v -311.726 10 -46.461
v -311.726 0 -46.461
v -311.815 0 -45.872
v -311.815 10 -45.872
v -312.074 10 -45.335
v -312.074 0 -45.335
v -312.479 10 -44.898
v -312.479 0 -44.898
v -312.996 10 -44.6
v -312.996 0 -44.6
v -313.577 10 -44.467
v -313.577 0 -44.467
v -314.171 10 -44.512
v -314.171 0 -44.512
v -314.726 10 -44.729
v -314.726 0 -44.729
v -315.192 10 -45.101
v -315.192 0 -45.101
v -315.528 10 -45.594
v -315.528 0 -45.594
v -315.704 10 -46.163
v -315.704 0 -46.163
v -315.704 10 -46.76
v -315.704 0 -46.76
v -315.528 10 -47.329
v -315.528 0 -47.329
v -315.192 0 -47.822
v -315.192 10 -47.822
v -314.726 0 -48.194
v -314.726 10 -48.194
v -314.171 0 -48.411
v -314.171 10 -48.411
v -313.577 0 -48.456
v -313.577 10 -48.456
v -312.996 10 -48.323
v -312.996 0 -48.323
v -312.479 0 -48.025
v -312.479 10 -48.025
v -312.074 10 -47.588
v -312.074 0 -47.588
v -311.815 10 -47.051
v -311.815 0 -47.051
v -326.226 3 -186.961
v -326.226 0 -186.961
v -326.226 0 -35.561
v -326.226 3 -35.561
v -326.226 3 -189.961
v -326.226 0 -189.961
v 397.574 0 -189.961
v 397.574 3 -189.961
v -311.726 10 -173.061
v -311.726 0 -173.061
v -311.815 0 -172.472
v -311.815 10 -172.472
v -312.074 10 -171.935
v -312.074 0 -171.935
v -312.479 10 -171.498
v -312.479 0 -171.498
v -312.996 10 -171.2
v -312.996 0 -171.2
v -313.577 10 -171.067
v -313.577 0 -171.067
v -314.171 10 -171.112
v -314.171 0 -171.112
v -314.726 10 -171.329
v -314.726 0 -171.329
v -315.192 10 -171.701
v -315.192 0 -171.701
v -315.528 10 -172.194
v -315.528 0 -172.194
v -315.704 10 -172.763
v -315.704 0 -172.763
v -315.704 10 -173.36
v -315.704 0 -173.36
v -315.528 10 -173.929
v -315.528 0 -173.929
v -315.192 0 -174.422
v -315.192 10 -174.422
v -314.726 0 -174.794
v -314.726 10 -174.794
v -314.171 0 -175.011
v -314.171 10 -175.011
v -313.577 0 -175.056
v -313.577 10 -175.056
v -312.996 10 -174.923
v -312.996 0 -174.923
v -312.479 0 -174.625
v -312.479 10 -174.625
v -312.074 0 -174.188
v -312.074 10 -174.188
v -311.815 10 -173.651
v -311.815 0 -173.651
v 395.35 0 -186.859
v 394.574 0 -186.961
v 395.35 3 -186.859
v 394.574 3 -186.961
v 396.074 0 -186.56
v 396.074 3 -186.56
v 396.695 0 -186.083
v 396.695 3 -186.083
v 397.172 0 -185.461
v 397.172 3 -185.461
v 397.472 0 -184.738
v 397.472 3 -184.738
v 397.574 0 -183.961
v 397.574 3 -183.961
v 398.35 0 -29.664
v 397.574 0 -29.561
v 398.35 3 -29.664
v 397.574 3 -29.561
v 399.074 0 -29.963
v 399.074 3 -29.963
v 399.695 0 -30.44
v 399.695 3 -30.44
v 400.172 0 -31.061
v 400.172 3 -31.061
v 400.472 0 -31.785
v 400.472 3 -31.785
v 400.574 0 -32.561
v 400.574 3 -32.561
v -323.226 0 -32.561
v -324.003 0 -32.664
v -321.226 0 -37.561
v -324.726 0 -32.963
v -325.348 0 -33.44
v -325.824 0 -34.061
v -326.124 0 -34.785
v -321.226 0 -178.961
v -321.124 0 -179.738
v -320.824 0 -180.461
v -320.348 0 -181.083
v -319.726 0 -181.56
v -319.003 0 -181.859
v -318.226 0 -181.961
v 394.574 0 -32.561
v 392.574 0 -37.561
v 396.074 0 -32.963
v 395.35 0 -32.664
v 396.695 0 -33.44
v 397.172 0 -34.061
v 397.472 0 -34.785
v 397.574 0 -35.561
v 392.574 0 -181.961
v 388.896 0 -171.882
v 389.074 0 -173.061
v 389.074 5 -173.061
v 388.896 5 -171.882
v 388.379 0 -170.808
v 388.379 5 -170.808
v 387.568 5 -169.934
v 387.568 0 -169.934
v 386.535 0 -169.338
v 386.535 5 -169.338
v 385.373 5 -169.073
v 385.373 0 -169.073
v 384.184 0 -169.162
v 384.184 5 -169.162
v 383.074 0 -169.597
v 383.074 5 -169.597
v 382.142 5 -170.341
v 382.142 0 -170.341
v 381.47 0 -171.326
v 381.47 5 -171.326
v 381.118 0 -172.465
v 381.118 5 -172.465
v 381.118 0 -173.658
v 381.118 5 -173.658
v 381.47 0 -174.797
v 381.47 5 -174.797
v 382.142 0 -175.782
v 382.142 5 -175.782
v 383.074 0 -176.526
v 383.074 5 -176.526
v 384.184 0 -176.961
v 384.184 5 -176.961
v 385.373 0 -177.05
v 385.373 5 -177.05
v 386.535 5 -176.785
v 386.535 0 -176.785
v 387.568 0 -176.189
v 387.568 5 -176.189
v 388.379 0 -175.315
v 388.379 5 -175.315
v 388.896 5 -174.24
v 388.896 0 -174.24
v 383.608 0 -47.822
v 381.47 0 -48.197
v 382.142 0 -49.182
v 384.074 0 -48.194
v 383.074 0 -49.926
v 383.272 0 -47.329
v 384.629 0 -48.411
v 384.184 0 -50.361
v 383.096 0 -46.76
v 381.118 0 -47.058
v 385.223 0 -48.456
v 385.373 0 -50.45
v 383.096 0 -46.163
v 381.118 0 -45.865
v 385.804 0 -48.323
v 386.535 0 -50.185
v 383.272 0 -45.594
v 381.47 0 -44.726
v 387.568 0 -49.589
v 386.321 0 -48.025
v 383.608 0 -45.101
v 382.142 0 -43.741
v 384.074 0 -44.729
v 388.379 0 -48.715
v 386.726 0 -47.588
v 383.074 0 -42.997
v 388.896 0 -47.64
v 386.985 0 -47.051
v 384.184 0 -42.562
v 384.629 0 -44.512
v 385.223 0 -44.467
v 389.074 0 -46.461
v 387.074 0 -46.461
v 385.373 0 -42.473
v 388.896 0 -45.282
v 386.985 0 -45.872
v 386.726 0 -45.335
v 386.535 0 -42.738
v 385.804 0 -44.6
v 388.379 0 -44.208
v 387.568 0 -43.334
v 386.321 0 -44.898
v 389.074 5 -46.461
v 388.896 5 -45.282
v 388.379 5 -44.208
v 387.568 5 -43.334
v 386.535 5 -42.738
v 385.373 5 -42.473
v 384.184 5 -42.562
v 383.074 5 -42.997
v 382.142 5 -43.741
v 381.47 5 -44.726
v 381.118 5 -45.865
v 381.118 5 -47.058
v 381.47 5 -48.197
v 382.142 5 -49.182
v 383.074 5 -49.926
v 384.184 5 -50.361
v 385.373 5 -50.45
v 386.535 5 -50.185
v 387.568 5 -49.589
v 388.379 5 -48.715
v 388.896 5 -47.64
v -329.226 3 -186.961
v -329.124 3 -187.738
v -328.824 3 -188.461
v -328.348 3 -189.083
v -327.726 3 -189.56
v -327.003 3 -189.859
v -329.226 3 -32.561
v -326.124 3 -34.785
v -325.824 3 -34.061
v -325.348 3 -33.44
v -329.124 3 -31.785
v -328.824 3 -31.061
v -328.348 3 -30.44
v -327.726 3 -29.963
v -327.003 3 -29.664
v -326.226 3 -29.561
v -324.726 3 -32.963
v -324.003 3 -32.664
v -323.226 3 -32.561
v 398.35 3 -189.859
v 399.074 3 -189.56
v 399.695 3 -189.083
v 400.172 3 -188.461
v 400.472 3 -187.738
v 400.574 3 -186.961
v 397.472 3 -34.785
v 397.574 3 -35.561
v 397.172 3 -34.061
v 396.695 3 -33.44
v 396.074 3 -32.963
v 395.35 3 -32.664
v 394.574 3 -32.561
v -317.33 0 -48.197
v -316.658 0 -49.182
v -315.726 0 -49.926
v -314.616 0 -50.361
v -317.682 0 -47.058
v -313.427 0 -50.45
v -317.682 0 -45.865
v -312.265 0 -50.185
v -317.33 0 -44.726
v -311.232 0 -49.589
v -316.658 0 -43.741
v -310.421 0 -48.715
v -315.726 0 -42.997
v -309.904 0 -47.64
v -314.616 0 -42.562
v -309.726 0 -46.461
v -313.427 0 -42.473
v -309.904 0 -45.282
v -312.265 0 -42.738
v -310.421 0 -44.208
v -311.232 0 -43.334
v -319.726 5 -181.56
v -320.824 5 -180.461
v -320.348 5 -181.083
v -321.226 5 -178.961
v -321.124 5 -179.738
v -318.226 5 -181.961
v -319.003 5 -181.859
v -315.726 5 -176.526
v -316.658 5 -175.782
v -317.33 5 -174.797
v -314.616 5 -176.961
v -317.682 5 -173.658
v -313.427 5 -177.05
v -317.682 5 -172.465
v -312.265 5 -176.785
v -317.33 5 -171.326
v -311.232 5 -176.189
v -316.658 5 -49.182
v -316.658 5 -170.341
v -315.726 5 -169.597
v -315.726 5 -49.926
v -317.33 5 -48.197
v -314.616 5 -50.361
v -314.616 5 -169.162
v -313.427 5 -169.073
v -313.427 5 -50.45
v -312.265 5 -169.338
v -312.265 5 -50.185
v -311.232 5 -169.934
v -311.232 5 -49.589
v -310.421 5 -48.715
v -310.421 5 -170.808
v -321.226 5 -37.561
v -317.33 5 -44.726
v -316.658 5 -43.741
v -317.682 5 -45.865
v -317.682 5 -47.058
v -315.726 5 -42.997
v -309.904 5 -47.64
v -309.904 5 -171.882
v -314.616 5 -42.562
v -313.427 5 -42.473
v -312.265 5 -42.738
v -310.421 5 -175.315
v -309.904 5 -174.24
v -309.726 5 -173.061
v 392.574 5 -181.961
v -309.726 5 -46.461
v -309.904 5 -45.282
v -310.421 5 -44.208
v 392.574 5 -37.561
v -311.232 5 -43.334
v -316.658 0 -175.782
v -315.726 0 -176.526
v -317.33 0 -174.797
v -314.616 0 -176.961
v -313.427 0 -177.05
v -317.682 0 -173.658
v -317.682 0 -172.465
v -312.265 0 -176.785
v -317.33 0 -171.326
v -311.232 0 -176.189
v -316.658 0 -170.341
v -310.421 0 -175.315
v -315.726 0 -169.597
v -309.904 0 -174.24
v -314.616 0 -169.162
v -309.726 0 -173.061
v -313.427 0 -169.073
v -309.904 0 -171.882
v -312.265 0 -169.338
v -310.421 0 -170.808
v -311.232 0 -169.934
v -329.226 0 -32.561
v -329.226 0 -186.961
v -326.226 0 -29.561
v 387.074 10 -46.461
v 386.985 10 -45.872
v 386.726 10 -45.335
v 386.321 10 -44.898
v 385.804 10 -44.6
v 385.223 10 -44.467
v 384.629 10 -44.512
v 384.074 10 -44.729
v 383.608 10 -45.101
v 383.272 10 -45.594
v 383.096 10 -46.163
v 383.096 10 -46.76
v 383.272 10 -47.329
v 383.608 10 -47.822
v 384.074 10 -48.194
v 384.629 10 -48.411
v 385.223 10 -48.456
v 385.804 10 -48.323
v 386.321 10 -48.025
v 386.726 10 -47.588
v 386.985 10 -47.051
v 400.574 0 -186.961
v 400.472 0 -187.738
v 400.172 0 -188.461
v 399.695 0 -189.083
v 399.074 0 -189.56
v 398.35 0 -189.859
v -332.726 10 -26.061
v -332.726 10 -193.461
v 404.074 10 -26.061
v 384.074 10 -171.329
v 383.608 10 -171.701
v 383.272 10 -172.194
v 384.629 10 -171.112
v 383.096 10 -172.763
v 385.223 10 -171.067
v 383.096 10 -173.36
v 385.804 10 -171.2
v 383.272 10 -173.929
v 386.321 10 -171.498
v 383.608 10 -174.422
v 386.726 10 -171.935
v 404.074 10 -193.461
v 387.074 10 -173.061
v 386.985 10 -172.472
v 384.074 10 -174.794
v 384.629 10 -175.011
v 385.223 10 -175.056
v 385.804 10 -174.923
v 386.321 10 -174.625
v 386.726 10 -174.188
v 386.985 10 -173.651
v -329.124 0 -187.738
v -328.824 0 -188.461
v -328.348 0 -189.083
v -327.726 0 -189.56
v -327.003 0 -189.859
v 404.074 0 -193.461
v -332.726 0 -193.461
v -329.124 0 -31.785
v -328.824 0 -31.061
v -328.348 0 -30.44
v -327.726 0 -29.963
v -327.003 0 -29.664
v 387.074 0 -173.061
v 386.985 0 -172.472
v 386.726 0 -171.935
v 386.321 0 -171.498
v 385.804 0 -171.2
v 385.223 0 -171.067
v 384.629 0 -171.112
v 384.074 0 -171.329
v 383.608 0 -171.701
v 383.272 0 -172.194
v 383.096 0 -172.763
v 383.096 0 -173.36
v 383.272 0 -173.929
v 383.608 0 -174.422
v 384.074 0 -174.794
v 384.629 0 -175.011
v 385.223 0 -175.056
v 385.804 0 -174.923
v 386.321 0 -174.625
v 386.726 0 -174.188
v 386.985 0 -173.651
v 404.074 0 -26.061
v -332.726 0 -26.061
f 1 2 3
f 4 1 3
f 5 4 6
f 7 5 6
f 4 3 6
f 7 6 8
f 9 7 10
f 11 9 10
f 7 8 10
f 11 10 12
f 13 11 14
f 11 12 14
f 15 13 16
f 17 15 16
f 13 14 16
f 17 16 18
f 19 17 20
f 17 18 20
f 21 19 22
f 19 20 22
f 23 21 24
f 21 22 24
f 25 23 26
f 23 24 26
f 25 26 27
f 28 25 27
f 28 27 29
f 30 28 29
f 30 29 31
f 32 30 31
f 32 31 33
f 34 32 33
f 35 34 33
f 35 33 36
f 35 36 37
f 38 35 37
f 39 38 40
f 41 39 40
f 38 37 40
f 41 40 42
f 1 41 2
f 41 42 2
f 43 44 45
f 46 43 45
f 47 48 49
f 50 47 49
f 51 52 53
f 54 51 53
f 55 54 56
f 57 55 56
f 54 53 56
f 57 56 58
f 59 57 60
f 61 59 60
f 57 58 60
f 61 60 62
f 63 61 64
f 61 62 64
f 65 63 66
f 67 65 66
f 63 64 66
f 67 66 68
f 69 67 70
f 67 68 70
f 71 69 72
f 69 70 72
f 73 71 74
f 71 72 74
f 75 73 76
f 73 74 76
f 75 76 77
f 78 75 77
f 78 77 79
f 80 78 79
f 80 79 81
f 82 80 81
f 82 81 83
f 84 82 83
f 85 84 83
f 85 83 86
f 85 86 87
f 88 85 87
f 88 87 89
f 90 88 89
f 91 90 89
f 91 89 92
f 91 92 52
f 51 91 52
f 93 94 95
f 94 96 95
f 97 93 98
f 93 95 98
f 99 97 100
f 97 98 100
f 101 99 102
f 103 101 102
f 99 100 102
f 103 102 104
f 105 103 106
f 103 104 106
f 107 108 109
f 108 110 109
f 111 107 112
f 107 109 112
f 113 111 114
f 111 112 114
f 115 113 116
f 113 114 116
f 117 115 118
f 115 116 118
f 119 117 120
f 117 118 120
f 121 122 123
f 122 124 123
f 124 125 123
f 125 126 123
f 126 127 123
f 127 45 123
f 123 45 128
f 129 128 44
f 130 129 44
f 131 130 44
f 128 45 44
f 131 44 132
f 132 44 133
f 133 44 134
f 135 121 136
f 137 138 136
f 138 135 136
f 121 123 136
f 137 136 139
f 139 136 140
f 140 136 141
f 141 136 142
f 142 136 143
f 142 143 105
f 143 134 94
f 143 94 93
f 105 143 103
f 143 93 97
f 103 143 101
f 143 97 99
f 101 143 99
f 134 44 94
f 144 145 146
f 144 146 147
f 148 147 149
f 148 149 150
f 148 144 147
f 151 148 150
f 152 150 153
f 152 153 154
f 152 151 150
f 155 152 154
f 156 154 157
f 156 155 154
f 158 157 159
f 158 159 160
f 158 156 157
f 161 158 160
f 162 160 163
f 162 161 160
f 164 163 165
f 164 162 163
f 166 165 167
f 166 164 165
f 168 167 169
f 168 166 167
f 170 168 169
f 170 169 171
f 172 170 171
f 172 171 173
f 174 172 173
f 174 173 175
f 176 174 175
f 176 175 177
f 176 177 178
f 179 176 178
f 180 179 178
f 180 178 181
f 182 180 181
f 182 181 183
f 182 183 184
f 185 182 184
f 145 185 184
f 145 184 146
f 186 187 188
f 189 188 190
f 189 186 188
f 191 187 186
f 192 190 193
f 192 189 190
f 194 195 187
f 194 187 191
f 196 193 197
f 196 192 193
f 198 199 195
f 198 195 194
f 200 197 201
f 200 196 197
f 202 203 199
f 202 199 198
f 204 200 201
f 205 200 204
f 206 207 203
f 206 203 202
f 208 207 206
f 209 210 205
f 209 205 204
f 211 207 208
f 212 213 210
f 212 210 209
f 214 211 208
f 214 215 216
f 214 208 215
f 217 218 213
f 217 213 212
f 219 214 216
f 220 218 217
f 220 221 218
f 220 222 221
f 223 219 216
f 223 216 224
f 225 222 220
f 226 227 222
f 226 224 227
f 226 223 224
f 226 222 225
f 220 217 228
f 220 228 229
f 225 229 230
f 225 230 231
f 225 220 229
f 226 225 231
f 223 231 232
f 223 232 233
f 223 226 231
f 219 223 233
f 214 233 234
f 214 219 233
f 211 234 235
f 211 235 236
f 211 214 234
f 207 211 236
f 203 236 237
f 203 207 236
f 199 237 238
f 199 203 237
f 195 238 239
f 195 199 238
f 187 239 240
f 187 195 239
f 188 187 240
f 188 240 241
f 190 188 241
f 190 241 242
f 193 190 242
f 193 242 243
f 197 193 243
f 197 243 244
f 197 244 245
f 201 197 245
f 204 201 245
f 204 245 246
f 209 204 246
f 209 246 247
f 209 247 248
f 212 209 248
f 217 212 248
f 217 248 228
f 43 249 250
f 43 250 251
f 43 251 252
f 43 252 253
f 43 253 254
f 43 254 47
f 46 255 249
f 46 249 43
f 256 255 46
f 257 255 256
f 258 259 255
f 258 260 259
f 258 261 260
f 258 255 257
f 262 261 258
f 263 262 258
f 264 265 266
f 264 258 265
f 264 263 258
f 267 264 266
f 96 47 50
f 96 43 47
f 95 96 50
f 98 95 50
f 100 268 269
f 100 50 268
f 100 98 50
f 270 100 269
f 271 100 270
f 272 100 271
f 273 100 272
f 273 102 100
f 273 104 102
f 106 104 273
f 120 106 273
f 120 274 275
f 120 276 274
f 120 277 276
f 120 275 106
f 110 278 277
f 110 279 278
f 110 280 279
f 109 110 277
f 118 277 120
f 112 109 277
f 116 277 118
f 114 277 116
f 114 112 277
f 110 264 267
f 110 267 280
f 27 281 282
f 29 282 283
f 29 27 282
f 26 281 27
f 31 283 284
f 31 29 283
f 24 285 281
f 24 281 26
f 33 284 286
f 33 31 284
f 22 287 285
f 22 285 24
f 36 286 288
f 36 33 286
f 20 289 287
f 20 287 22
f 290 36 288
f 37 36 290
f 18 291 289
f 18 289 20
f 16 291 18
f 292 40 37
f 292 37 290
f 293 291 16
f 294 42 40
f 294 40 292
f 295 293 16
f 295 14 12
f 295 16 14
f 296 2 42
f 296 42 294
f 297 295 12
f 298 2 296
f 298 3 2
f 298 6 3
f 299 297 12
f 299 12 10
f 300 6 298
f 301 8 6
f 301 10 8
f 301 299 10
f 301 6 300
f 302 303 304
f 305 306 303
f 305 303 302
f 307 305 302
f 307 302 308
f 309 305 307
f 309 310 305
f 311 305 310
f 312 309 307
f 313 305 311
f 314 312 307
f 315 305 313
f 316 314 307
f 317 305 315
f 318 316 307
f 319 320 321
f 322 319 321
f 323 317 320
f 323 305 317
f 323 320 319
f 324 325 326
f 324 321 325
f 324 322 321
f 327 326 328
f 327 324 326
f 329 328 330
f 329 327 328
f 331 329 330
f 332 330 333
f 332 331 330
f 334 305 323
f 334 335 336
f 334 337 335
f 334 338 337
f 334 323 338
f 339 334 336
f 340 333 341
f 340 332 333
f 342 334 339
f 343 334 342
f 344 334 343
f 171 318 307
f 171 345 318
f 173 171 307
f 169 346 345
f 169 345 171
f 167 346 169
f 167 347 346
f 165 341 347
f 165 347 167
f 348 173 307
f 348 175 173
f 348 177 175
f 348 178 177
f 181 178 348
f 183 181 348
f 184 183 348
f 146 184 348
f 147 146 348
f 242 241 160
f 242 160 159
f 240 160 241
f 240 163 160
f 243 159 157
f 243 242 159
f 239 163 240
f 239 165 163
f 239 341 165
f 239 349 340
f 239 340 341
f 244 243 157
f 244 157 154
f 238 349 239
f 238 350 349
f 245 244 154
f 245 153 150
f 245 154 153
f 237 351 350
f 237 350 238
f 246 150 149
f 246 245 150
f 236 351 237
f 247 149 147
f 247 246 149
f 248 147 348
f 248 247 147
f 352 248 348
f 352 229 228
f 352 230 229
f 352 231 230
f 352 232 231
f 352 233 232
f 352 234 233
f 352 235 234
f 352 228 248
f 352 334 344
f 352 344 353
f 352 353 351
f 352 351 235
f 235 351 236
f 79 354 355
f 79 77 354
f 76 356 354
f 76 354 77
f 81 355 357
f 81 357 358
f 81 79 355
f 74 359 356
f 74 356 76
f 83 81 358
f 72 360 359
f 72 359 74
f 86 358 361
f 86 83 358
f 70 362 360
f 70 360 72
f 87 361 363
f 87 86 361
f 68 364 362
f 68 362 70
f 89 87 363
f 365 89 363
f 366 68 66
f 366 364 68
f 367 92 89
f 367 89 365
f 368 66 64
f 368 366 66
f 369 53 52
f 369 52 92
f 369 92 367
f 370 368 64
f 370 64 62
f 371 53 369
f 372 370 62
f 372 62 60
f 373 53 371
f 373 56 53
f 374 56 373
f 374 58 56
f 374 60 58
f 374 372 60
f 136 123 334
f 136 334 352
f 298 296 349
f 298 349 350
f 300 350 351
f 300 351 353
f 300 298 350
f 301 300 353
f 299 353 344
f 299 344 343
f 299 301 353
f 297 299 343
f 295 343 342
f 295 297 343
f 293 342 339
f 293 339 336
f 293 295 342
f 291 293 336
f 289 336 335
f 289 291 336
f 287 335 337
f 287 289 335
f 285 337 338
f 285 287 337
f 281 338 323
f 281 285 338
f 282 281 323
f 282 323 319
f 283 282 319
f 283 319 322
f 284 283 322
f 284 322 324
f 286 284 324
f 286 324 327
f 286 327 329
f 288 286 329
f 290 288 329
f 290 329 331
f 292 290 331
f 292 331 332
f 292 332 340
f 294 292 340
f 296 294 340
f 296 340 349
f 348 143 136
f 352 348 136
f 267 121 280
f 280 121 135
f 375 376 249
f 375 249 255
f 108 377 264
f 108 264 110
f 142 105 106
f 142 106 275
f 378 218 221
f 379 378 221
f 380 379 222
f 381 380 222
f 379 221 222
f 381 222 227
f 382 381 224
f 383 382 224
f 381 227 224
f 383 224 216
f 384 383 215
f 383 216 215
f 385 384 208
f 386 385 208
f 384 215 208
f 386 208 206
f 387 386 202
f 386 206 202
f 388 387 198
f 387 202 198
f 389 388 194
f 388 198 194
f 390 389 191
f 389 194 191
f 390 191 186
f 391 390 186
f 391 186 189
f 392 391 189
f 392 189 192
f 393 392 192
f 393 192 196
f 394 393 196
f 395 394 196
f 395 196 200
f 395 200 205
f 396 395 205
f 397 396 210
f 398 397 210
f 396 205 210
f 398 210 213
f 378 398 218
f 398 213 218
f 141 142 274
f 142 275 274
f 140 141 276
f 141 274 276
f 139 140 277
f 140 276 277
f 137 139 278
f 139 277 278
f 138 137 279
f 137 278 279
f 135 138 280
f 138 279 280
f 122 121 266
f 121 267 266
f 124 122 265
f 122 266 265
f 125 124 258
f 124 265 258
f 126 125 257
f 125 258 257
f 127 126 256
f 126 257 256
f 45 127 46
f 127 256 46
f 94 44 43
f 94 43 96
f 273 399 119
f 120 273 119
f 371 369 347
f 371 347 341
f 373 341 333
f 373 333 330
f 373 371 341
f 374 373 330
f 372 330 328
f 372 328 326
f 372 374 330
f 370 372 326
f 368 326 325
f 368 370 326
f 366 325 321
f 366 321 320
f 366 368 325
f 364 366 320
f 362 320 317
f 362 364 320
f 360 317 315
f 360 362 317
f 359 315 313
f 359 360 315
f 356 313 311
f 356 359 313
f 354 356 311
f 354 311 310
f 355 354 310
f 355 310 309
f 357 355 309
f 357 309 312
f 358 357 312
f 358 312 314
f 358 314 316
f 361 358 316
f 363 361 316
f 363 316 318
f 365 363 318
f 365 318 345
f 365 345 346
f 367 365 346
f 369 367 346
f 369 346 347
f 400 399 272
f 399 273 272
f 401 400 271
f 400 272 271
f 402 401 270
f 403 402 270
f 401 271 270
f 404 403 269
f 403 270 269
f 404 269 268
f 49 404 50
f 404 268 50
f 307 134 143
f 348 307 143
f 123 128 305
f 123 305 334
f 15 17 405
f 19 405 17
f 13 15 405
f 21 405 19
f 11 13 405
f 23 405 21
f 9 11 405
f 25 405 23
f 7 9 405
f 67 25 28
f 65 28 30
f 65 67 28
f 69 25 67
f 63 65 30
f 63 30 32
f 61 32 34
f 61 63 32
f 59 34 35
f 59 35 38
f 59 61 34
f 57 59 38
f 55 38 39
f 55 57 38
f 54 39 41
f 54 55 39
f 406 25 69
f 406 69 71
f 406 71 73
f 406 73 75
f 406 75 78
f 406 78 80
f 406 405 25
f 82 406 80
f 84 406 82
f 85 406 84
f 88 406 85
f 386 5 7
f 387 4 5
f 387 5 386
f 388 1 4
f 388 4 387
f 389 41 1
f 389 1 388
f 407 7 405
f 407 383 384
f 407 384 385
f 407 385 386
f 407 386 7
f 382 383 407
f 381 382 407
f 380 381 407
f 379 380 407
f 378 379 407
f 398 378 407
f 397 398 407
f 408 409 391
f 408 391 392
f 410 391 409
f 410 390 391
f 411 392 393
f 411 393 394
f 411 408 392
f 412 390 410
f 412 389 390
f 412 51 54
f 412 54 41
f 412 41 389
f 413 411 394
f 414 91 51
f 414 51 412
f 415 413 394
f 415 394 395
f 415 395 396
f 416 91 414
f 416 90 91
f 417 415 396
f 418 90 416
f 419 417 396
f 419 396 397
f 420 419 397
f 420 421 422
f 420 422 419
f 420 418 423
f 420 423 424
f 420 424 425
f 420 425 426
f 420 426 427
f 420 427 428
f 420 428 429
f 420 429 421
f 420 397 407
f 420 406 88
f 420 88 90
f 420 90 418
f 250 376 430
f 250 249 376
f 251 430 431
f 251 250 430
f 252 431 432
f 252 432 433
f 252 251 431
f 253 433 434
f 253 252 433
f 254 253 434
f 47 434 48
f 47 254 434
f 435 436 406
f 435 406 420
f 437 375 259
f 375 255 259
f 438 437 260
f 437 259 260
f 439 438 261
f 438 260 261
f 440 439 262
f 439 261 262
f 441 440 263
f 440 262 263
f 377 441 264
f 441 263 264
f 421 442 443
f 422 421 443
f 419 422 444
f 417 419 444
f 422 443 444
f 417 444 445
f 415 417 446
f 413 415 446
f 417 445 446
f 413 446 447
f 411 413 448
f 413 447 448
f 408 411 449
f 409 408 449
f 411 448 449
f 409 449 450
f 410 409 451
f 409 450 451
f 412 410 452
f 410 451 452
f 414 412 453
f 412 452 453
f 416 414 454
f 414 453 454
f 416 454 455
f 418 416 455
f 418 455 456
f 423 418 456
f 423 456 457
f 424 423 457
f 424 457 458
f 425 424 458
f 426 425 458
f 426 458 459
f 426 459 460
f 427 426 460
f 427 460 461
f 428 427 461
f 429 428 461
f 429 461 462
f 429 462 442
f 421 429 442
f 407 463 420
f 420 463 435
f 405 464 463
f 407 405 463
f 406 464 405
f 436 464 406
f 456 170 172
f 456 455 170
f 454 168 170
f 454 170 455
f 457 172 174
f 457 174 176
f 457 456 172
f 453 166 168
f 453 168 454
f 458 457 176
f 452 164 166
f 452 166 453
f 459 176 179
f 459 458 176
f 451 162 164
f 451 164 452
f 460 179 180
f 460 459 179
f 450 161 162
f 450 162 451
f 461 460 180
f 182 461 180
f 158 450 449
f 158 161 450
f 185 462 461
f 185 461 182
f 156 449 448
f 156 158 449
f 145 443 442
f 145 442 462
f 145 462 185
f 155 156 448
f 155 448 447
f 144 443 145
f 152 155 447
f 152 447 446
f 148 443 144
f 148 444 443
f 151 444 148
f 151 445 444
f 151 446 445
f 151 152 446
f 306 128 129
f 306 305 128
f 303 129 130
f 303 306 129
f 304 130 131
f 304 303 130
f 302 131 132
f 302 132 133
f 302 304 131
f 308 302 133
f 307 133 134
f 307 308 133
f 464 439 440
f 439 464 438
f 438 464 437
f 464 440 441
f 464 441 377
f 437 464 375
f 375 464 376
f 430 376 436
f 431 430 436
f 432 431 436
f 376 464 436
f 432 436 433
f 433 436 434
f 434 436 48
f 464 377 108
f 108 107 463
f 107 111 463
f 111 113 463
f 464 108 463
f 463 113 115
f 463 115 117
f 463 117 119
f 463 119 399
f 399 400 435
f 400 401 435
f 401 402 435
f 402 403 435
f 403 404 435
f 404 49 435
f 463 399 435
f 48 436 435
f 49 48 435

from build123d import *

# Parameters (mm, degrees)
SZKIC1_W                                   = 736.8
SZKIC1_H                                   = 167.4
DODANIE_WYCI_GNI_CIE1_DEPTH                = 10
SZKIC2_W                                   = 729.8
SZKIC2_H                                   = 160.4
SZKIC2_W_2                                 = 723.8
SZKIC2_H_2                                 = 154.4
WYCI_CIE_WYCI_GNI_CIE_CIENKA_CIANKA1_DEPTH = 3
SZKIC3_W                                   = 713.8
SZKIC3_H                                   = 144.4
WYTNIJ_WYCI_GNI_CIE1_DEPTH                 = 5
ZAOKR_GLENIE1_R                            = 3
SZKIC4_R                                   = 4
SZKIC4_R_2                                 = 2
DODANIE_WYCI_GNI_CIE2_DEPTH                = 10
SZKIC4_3_R                                 = 2
WYTNIJ_WYCI_GNI_CIE2_DEPTH                 = 10


with BuildPart() as part:
    # Szkic1 → Dodanie-wyci_gni_cie1 (new body)
    with BuildSketch(Plane(origin=(0, 0, 0), x_dir=(1, 0, 0), z_dir=(0, 1, 0))):
        with Locations((35.673743017, 109.761452514)):
            Rectangle(SZKIC1_W, SZKIC1_H)
    extrude(amount=DODANIE_WYCI_GNI_CIE1_DEPTH)

    # Szkic2 → Wyci_cie-wyci_gni_cie-cienka _cianka1 (cut)
    with BuildSketch(Plane.XZ):
        with Locations((35.673743017, -109.761452514)):
            Rectangle(SZKIC2_W, SZKIC2_H)
        with Locations((35.673743017, -109.761452514)):
            Rectangle(SZKIC2_W_2, SZKIC2_H_2, mode=Mode.SUBTRACT)
    extrude(amount=-WYCI_CIE_WYCI_GNI_CIE_CIENKA_CIANKA1_DEPTH, mode=Mode.SUBTRACT)

    # Szkic3 → Wytnij-wyci_gni_cie1 (cut)
    with BuildSketch(Plane.XZ):
        with Locations((35.673743017, -109.761452514)):
            Rectangle(SZKIC3_W, SZKIC3_H)
    extrude(amount=-WYTNIJ_WYCI_GNI_CIE1_DEPTH, mode=Mode.SUBTRACT)

    # Zaokr_glenie1
    zaokr_glenie1_edges = [part.edges().sort_by_distance(p)[0] for p in [
        (-321.226256983, 2.5, -181.961452514),
        (-329.226256983, 1.5, -189.961452514),
        (-329.226256983, 1.5, -29.561452514),
        (-326.226256983, 1.5, -32.561452514),
        (397.573743017, 1.5, -32.561452514),
        (400.573743017, 1.5, -29.561452514),
        (400.573743017, 1.5, -189.961452514),
        (397.573743017, 1.5, -186.961452514),
    ]]
    fillet(zaokr_glenie1_edges, radius=ZAOKR_GLENIE1_R)

    # Szkic4 → Dodanie-wyci_gni_cie2 (add)
    # profile 1 of 4: a face of its own
    with BuildSketch(Plane.XZ):
        with Locations((-313.726256983, -46.461452514)):
            Circle(SZKIC4_R)
    # profile 2 of 4: a face of its own
    with BuildSketch(Plane.XZ):
        with Locations((-313.726256983, -173.061452514)):
            Circle(SZKIC4_R)
        with Locations((-313.726256983, -173.061452514)):
            Circle(SZKIC4_R_2, mode=Mode.SUBTRACT)
    # profile 3 of 4: a face of its own
    with BuildSketch(Plane.XZ):
        with Locations((385.073743017, -173.061452514)):
            Circle(SZKIC4_R)
        with Locations((385.073743017, -173.061452514)):
            Circle(SZKIC4_R_2, mode=Mode.SUBTRACT)
    # profile 4 of 4: a face of its own
    with BuildSketch(Plane.XZ):
        with Locations((385.073743017, -46.461452514)):
            Circle(SZKIC4_R)
    extrude(amount=-DODANIE_WYCI_GNI_CIE2_DEPTH)

    # Szkic4_3 → Wytnij-wyci_gni_cie2 (cut)
    with BuildSketch(Plane.XZ):
        with Locations((-313.726256983, -46.461452514)):
            Circle(SZKIC4_3_R)
        with Locations((-313.726256983, -173.061452514)):
            Circle(SZKIC4_3_R)
        with Locations((385.073743017, -173.061452514)):
            Circle(SZKIC4_3_R)
        with Locations((385.073743017, -46.461452514)):
            Circle(SZKIC4_3_R)
    extrude(amount=-WYTNIJ_WYCI_GNI_CIE2_DEPTH, mode=Mode.SUBTRACT)


solid = part.part
